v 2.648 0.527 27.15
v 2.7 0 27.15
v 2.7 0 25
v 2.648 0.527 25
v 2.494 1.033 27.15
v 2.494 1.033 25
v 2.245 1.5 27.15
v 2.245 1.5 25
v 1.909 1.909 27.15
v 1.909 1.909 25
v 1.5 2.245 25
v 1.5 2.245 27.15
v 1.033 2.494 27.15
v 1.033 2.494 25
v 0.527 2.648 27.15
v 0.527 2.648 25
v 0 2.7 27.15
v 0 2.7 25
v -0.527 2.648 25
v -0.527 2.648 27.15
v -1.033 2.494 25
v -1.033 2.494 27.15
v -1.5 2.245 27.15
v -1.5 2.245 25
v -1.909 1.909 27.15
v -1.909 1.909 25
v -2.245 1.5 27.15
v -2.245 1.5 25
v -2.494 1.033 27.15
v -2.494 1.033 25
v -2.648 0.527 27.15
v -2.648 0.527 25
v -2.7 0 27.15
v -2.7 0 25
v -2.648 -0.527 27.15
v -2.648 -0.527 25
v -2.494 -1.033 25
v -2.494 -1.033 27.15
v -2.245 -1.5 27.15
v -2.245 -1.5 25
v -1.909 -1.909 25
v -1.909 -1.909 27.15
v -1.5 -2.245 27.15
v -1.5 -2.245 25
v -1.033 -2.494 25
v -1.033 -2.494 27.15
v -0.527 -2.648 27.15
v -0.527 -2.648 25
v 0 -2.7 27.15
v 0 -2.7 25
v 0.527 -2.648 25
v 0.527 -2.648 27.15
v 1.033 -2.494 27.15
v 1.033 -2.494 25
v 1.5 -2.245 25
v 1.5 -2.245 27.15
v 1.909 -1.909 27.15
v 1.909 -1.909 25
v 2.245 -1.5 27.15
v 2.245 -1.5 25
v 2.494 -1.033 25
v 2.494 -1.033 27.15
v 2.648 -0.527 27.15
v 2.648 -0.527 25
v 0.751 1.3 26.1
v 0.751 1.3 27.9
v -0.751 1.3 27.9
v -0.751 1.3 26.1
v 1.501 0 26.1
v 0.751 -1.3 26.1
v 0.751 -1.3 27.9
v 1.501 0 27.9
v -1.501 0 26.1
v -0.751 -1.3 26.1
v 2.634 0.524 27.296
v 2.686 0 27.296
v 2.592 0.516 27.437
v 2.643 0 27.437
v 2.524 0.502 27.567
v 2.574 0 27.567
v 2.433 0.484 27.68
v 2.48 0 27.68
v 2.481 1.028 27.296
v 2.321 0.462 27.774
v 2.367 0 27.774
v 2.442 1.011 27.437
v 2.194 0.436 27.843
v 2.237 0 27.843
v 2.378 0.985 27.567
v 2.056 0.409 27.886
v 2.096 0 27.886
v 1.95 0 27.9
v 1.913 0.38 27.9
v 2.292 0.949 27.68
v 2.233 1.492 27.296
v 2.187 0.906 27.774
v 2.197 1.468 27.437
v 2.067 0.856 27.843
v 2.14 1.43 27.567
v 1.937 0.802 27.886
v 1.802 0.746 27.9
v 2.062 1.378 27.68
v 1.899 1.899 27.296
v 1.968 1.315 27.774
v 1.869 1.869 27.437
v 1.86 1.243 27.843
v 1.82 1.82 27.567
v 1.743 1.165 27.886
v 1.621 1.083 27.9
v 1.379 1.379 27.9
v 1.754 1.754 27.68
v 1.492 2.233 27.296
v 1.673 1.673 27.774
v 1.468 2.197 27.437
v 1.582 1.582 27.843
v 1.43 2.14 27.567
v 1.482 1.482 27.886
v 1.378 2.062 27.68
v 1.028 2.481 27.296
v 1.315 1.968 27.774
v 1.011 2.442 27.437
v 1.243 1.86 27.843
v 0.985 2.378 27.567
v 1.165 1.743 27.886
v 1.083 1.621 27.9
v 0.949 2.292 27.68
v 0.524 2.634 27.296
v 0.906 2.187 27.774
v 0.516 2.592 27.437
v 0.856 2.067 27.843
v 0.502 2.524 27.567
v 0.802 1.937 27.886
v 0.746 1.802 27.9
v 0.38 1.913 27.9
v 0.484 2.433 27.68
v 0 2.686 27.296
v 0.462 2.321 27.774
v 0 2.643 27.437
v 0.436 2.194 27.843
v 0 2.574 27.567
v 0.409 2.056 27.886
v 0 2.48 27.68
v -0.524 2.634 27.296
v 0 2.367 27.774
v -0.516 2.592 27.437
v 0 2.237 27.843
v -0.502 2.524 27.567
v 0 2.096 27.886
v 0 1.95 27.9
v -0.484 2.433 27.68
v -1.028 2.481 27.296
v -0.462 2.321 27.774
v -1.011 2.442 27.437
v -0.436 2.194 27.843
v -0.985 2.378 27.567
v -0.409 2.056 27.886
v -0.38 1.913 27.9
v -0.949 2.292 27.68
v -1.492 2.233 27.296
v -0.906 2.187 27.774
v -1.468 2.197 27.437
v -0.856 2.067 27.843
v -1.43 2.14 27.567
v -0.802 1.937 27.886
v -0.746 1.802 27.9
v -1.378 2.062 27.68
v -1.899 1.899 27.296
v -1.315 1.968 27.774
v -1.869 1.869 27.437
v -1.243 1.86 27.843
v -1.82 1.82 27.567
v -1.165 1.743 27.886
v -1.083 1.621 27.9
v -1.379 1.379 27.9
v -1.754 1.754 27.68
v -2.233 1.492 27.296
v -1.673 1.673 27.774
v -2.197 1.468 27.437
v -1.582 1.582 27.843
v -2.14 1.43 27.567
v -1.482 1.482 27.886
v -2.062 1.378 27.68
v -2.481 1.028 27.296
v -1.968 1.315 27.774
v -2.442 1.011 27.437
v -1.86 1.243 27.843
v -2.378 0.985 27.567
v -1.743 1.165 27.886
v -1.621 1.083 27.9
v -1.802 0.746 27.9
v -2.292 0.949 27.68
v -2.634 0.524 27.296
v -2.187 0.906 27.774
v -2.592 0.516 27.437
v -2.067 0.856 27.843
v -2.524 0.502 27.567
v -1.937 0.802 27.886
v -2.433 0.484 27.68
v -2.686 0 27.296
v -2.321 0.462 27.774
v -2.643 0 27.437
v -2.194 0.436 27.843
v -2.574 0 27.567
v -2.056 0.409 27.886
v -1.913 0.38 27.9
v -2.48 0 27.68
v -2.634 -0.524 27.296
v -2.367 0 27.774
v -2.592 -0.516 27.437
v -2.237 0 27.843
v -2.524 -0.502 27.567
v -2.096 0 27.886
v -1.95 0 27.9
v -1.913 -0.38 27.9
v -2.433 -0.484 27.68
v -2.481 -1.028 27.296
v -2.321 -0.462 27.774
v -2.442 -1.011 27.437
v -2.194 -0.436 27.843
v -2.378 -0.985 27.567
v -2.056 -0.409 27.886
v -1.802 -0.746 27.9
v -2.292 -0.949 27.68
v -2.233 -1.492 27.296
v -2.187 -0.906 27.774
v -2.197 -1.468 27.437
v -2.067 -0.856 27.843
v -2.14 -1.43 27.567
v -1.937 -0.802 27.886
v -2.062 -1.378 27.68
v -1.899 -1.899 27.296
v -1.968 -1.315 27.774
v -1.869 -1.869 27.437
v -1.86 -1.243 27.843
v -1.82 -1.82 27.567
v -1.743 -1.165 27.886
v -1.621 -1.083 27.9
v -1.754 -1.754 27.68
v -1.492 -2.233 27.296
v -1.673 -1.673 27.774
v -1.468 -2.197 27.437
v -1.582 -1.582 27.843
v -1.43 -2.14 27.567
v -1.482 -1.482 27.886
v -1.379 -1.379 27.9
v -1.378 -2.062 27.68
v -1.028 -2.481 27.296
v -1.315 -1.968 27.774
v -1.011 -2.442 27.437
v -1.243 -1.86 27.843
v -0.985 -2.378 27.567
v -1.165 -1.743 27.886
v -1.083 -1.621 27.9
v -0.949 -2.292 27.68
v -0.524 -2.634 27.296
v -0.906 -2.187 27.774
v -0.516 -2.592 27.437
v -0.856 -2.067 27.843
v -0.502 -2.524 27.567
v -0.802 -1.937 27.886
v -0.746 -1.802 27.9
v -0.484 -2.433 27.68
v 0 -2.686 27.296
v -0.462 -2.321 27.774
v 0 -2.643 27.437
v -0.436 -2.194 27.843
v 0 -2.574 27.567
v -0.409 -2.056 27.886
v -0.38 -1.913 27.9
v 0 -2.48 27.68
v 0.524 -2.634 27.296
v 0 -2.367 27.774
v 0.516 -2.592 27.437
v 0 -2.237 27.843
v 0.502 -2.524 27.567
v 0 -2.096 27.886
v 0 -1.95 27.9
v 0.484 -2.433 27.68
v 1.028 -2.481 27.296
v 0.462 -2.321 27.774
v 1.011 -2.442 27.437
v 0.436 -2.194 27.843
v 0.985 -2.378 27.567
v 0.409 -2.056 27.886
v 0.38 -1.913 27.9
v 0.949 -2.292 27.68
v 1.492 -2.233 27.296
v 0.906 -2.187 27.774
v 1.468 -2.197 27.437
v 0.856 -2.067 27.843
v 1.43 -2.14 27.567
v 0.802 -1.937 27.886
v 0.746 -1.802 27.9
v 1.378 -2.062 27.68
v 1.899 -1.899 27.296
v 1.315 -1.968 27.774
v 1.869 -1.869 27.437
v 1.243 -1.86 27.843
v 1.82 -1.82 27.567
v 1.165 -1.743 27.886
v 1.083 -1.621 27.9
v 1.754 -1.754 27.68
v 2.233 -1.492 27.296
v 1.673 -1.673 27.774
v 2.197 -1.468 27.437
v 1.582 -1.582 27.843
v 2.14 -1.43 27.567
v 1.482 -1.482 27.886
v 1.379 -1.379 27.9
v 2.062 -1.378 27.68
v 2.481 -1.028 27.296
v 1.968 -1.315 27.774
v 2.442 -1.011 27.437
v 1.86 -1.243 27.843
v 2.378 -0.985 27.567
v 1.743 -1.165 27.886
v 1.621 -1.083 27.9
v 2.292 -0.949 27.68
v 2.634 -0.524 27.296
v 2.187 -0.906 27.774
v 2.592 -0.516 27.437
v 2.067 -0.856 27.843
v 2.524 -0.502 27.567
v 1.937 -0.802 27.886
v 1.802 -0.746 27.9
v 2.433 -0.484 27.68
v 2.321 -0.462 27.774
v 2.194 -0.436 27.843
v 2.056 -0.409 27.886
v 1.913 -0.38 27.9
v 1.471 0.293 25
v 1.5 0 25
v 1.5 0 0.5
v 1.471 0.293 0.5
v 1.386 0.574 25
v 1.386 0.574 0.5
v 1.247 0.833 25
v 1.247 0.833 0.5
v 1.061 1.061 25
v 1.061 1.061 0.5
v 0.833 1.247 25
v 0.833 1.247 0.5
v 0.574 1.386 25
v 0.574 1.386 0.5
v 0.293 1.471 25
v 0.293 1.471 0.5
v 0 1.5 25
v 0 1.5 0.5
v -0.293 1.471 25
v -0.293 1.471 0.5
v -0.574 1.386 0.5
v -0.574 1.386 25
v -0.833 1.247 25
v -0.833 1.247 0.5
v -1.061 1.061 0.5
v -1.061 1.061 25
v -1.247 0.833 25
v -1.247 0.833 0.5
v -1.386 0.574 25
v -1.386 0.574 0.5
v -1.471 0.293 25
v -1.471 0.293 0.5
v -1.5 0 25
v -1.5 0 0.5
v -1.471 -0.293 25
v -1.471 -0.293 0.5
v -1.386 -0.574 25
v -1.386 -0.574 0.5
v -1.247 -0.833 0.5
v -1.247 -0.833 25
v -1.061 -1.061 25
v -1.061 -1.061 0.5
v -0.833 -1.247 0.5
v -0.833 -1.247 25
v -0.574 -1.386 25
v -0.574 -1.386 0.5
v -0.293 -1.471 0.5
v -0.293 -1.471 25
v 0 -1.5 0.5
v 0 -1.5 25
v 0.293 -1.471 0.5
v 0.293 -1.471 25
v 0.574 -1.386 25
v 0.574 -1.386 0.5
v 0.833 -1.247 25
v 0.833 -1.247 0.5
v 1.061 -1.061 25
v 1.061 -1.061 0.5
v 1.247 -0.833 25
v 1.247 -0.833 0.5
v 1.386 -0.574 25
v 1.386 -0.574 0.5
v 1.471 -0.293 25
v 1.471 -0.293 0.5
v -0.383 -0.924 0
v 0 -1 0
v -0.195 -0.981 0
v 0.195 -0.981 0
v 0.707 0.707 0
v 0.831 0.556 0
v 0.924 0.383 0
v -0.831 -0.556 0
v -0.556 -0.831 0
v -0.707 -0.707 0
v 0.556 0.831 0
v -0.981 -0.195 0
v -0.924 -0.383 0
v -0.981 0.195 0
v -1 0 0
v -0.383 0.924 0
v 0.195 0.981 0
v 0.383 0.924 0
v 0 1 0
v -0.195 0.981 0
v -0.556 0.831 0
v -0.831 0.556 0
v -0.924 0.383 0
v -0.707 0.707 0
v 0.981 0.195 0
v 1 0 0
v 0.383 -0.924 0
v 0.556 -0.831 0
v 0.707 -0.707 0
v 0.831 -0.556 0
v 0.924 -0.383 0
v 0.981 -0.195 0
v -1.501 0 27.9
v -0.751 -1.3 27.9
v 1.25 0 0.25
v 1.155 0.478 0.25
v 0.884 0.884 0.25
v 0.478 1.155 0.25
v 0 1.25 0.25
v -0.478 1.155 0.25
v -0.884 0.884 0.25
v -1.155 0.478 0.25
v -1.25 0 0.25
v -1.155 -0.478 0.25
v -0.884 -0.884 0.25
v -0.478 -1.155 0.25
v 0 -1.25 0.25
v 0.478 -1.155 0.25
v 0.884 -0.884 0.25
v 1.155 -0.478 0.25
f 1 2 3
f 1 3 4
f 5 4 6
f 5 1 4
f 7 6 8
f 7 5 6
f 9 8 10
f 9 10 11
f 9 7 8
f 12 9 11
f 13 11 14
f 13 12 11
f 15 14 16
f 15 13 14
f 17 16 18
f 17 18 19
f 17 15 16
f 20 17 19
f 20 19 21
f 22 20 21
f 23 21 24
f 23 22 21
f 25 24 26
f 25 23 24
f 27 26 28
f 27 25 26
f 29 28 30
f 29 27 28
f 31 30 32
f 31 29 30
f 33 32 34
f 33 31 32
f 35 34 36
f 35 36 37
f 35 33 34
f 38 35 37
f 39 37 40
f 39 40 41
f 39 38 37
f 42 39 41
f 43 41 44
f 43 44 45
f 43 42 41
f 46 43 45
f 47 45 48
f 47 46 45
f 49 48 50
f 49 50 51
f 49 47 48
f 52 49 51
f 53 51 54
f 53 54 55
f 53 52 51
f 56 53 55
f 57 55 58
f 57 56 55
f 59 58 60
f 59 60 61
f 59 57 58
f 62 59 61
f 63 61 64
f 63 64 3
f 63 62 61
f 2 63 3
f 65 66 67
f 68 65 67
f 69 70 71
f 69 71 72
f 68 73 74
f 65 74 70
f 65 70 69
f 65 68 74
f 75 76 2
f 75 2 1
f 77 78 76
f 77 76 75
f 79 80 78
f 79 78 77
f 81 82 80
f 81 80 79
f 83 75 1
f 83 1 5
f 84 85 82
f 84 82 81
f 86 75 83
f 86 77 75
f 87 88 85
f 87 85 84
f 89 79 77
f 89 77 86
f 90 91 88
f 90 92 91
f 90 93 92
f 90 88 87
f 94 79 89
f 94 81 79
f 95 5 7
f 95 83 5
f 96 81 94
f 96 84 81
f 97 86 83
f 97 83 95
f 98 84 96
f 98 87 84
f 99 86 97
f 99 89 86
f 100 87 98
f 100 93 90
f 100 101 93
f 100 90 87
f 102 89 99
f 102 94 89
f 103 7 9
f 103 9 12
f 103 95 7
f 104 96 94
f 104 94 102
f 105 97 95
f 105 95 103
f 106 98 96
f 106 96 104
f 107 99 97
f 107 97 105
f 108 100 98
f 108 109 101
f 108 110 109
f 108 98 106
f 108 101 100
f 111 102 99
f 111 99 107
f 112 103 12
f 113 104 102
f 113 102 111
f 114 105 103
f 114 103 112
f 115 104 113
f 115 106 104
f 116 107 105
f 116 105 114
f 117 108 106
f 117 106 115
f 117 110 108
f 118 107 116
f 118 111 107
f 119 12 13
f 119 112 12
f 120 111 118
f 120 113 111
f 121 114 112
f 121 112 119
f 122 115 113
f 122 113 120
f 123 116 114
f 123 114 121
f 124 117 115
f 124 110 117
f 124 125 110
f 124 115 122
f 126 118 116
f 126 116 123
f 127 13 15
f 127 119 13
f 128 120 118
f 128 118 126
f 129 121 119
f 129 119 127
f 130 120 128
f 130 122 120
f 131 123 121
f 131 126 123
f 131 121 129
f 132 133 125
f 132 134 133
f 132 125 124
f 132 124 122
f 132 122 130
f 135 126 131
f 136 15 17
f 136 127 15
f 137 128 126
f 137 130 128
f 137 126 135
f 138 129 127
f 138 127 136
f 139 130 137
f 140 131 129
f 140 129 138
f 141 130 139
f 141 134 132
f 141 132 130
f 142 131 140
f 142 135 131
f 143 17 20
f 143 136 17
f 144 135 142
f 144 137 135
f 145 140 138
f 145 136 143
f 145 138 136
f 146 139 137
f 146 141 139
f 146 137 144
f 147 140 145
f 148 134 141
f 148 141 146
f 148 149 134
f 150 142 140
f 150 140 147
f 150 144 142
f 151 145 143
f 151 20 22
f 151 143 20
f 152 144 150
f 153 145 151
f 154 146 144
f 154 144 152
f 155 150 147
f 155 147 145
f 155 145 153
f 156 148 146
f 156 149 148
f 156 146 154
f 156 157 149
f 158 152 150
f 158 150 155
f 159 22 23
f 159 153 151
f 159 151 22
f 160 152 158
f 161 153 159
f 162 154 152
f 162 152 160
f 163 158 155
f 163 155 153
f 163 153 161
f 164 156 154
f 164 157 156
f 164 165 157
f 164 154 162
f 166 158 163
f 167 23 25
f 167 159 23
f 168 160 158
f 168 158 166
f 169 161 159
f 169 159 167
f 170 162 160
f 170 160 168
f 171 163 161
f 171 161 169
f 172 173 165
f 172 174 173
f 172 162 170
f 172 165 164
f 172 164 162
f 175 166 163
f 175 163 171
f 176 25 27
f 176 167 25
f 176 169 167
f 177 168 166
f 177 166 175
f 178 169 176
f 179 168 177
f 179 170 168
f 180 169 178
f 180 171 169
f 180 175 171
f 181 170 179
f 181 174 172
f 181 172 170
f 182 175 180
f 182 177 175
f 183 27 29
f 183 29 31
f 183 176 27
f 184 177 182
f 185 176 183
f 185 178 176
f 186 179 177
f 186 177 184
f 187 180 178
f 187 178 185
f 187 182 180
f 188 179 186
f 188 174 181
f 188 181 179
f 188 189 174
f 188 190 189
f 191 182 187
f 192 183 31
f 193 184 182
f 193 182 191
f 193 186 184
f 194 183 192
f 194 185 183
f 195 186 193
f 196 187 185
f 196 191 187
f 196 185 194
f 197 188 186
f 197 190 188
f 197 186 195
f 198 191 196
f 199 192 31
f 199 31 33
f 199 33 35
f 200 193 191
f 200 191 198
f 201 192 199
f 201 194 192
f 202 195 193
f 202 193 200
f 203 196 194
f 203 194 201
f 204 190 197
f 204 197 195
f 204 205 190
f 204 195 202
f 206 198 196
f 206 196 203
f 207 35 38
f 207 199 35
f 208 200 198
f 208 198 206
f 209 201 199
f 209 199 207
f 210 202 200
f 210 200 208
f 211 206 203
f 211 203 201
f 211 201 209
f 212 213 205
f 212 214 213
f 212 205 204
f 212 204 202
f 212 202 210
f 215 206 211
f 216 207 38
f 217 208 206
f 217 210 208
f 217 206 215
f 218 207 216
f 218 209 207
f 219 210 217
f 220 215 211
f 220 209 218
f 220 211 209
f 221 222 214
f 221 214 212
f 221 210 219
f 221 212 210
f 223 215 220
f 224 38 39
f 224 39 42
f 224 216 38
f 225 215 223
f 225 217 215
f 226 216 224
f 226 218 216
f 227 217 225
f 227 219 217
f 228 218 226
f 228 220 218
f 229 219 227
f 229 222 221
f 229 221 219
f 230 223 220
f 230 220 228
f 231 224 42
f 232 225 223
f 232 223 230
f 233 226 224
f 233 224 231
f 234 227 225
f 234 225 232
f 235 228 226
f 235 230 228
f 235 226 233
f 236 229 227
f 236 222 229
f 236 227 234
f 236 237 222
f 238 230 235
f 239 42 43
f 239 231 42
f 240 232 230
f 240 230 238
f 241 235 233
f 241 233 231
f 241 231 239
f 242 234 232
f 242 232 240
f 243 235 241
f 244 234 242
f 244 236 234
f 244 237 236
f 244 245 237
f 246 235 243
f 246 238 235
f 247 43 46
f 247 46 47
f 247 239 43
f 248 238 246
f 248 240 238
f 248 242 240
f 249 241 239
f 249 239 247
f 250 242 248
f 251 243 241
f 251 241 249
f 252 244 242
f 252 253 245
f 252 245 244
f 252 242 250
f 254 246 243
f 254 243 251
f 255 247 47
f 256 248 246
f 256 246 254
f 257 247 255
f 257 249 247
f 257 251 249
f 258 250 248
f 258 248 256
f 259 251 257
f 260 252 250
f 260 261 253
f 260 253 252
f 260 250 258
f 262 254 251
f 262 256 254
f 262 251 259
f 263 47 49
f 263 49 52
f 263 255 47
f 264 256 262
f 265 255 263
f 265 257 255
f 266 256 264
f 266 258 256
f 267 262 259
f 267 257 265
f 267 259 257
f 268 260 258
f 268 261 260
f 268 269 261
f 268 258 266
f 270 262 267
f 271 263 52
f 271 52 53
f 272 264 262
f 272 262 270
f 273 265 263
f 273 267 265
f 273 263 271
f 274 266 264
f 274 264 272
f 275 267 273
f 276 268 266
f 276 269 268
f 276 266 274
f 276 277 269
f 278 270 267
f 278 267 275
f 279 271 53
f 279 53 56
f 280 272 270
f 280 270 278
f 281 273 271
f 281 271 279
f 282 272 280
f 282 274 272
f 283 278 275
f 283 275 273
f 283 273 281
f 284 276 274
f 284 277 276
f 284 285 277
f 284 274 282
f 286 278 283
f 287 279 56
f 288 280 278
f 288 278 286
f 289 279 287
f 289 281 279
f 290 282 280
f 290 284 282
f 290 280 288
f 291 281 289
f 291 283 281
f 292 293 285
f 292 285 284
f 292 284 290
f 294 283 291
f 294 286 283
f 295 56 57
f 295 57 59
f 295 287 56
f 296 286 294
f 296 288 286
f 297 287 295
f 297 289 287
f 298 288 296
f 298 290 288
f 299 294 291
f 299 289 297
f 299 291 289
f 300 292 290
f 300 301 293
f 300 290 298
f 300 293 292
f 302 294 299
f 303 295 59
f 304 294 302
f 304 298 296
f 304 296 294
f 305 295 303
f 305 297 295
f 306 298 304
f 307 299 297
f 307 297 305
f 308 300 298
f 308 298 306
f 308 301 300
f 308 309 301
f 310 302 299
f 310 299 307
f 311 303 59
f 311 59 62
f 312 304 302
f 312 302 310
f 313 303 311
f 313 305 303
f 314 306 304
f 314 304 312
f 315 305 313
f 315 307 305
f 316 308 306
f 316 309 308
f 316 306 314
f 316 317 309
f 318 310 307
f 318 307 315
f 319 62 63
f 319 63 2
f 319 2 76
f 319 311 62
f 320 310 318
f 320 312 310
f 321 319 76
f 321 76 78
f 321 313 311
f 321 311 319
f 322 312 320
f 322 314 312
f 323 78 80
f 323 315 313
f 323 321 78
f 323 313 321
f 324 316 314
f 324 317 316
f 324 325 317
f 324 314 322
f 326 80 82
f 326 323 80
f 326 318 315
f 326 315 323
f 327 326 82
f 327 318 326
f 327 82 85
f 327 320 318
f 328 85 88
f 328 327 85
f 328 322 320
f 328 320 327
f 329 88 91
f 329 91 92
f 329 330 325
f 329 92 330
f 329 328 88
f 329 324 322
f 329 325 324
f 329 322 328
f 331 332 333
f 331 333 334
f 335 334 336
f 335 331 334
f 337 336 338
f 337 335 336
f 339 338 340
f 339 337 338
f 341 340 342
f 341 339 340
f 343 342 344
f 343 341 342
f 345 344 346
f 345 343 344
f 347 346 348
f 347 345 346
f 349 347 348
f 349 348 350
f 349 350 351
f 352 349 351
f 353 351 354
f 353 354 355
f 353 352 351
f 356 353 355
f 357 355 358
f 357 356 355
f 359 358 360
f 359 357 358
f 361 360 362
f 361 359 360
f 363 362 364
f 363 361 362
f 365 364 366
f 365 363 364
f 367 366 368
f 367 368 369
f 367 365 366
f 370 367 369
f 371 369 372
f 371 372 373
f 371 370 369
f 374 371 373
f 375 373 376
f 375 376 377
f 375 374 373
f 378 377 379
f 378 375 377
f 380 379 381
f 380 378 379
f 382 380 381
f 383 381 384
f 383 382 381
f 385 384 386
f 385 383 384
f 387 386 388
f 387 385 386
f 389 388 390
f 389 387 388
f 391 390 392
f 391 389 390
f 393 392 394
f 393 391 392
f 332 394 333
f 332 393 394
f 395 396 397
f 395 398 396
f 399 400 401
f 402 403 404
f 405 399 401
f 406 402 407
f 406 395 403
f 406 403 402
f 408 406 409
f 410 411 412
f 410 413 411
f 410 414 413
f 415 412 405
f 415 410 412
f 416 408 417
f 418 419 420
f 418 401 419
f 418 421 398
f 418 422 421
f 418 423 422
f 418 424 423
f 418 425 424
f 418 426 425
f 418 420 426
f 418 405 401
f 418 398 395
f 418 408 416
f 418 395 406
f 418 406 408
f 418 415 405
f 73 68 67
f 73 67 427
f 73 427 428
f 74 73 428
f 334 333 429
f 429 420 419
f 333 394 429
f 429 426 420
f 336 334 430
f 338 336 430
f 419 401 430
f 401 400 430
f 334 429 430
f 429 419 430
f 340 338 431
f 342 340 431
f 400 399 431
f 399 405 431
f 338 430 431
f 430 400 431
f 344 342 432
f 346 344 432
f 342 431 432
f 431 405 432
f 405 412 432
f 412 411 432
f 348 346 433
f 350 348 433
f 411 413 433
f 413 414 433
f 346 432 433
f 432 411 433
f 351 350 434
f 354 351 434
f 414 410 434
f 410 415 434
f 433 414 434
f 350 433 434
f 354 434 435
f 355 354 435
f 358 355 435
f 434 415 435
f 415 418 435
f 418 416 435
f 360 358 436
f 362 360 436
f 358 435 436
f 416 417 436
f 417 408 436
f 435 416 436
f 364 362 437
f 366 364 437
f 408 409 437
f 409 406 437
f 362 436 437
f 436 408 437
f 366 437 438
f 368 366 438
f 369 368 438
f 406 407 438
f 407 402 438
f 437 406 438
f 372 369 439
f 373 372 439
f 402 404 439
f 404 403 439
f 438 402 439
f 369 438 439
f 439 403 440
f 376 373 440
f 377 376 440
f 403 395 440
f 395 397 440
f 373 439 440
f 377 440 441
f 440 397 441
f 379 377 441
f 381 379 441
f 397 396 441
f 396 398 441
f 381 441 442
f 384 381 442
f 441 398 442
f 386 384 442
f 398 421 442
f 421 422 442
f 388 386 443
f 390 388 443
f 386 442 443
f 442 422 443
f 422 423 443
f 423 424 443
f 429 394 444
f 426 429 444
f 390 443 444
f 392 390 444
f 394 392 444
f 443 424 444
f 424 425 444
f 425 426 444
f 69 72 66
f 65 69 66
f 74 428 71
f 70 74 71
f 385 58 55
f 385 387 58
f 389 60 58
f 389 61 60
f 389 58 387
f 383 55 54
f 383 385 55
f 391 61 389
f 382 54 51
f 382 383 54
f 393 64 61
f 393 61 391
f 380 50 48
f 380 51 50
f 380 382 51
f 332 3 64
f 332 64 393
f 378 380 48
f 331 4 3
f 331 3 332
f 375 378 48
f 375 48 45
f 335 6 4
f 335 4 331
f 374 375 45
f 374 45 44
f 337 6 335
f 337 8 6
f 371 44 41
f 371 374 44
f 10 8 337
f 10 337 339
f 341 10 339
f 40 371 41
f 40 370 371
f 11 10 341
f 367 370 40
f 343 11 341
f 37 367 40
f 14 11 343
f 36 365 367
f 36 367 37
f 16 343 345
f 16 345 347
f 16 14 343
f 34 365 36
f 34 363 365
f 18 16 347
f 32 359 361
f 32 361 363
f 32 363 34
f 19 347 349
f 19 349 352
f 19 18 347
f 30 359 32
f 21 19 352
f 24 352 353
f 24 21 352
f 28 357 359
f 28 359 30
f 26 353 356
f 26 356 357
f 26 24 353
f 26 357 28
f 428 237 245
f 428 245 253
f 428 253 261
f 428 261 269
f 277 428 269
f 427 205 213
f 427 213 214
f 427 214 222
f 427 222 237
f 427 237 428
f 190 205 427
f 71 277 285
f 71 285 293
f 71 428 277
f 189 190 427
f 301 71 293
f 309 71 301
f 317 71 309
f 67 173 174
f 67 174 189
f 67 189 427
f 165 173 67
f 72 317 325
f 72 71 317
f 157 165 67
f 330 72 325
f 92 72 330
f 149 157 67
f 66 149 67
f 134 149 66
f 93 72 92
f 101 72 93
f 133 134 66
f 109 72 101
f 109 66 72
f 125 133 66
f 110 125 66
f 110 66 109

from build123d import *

# Parameters (mm, degrees)
F3_DEPTH = 1.8
F4_R     = 0.75
F5_SIZE  = 0.5


with BuildPart() as f1:
    # F0 (on Front) → F1 (revolve)
    with BuildSketch(Plane.XZ):
        Polygon((0, 27.9), (0, 0), (1.5, 0), (1.5, 25), (2.7, 25), (2.7, 27.9), align=None)
    revolve(axis=Axis((0, 0, 13.95), (0, 0, 1)))

    # F2 (on face) → F3 (cut)
    with BuildSketch(Plane.XY.offset(27.9)):
        Polygon((0.750555, 1.3), (-0.750555, 1.3), (-1.501111, 0), (-0.750555, -1.3), (0.750555, -1.3), (1.501111, 0), align=None)
    extrude(amount=-F3_DEPTH, mode=Mode.SUBTRACT)

    # F4
    f4_edges = [f1.edges().sort_by_distance(p)[0] for p in [
        (-2.7, 0, 27.9),
    ]]
    fillet(f4_edges, radius=F4_R)

    # F5
    f5_edges = [f1.edges().sort_by_distance(p)[0] for p in [
        (-1.5, 0, 0),
    ]]
    chamfer(f5_edges, length=F5_SIZE)


solid = f1.part
